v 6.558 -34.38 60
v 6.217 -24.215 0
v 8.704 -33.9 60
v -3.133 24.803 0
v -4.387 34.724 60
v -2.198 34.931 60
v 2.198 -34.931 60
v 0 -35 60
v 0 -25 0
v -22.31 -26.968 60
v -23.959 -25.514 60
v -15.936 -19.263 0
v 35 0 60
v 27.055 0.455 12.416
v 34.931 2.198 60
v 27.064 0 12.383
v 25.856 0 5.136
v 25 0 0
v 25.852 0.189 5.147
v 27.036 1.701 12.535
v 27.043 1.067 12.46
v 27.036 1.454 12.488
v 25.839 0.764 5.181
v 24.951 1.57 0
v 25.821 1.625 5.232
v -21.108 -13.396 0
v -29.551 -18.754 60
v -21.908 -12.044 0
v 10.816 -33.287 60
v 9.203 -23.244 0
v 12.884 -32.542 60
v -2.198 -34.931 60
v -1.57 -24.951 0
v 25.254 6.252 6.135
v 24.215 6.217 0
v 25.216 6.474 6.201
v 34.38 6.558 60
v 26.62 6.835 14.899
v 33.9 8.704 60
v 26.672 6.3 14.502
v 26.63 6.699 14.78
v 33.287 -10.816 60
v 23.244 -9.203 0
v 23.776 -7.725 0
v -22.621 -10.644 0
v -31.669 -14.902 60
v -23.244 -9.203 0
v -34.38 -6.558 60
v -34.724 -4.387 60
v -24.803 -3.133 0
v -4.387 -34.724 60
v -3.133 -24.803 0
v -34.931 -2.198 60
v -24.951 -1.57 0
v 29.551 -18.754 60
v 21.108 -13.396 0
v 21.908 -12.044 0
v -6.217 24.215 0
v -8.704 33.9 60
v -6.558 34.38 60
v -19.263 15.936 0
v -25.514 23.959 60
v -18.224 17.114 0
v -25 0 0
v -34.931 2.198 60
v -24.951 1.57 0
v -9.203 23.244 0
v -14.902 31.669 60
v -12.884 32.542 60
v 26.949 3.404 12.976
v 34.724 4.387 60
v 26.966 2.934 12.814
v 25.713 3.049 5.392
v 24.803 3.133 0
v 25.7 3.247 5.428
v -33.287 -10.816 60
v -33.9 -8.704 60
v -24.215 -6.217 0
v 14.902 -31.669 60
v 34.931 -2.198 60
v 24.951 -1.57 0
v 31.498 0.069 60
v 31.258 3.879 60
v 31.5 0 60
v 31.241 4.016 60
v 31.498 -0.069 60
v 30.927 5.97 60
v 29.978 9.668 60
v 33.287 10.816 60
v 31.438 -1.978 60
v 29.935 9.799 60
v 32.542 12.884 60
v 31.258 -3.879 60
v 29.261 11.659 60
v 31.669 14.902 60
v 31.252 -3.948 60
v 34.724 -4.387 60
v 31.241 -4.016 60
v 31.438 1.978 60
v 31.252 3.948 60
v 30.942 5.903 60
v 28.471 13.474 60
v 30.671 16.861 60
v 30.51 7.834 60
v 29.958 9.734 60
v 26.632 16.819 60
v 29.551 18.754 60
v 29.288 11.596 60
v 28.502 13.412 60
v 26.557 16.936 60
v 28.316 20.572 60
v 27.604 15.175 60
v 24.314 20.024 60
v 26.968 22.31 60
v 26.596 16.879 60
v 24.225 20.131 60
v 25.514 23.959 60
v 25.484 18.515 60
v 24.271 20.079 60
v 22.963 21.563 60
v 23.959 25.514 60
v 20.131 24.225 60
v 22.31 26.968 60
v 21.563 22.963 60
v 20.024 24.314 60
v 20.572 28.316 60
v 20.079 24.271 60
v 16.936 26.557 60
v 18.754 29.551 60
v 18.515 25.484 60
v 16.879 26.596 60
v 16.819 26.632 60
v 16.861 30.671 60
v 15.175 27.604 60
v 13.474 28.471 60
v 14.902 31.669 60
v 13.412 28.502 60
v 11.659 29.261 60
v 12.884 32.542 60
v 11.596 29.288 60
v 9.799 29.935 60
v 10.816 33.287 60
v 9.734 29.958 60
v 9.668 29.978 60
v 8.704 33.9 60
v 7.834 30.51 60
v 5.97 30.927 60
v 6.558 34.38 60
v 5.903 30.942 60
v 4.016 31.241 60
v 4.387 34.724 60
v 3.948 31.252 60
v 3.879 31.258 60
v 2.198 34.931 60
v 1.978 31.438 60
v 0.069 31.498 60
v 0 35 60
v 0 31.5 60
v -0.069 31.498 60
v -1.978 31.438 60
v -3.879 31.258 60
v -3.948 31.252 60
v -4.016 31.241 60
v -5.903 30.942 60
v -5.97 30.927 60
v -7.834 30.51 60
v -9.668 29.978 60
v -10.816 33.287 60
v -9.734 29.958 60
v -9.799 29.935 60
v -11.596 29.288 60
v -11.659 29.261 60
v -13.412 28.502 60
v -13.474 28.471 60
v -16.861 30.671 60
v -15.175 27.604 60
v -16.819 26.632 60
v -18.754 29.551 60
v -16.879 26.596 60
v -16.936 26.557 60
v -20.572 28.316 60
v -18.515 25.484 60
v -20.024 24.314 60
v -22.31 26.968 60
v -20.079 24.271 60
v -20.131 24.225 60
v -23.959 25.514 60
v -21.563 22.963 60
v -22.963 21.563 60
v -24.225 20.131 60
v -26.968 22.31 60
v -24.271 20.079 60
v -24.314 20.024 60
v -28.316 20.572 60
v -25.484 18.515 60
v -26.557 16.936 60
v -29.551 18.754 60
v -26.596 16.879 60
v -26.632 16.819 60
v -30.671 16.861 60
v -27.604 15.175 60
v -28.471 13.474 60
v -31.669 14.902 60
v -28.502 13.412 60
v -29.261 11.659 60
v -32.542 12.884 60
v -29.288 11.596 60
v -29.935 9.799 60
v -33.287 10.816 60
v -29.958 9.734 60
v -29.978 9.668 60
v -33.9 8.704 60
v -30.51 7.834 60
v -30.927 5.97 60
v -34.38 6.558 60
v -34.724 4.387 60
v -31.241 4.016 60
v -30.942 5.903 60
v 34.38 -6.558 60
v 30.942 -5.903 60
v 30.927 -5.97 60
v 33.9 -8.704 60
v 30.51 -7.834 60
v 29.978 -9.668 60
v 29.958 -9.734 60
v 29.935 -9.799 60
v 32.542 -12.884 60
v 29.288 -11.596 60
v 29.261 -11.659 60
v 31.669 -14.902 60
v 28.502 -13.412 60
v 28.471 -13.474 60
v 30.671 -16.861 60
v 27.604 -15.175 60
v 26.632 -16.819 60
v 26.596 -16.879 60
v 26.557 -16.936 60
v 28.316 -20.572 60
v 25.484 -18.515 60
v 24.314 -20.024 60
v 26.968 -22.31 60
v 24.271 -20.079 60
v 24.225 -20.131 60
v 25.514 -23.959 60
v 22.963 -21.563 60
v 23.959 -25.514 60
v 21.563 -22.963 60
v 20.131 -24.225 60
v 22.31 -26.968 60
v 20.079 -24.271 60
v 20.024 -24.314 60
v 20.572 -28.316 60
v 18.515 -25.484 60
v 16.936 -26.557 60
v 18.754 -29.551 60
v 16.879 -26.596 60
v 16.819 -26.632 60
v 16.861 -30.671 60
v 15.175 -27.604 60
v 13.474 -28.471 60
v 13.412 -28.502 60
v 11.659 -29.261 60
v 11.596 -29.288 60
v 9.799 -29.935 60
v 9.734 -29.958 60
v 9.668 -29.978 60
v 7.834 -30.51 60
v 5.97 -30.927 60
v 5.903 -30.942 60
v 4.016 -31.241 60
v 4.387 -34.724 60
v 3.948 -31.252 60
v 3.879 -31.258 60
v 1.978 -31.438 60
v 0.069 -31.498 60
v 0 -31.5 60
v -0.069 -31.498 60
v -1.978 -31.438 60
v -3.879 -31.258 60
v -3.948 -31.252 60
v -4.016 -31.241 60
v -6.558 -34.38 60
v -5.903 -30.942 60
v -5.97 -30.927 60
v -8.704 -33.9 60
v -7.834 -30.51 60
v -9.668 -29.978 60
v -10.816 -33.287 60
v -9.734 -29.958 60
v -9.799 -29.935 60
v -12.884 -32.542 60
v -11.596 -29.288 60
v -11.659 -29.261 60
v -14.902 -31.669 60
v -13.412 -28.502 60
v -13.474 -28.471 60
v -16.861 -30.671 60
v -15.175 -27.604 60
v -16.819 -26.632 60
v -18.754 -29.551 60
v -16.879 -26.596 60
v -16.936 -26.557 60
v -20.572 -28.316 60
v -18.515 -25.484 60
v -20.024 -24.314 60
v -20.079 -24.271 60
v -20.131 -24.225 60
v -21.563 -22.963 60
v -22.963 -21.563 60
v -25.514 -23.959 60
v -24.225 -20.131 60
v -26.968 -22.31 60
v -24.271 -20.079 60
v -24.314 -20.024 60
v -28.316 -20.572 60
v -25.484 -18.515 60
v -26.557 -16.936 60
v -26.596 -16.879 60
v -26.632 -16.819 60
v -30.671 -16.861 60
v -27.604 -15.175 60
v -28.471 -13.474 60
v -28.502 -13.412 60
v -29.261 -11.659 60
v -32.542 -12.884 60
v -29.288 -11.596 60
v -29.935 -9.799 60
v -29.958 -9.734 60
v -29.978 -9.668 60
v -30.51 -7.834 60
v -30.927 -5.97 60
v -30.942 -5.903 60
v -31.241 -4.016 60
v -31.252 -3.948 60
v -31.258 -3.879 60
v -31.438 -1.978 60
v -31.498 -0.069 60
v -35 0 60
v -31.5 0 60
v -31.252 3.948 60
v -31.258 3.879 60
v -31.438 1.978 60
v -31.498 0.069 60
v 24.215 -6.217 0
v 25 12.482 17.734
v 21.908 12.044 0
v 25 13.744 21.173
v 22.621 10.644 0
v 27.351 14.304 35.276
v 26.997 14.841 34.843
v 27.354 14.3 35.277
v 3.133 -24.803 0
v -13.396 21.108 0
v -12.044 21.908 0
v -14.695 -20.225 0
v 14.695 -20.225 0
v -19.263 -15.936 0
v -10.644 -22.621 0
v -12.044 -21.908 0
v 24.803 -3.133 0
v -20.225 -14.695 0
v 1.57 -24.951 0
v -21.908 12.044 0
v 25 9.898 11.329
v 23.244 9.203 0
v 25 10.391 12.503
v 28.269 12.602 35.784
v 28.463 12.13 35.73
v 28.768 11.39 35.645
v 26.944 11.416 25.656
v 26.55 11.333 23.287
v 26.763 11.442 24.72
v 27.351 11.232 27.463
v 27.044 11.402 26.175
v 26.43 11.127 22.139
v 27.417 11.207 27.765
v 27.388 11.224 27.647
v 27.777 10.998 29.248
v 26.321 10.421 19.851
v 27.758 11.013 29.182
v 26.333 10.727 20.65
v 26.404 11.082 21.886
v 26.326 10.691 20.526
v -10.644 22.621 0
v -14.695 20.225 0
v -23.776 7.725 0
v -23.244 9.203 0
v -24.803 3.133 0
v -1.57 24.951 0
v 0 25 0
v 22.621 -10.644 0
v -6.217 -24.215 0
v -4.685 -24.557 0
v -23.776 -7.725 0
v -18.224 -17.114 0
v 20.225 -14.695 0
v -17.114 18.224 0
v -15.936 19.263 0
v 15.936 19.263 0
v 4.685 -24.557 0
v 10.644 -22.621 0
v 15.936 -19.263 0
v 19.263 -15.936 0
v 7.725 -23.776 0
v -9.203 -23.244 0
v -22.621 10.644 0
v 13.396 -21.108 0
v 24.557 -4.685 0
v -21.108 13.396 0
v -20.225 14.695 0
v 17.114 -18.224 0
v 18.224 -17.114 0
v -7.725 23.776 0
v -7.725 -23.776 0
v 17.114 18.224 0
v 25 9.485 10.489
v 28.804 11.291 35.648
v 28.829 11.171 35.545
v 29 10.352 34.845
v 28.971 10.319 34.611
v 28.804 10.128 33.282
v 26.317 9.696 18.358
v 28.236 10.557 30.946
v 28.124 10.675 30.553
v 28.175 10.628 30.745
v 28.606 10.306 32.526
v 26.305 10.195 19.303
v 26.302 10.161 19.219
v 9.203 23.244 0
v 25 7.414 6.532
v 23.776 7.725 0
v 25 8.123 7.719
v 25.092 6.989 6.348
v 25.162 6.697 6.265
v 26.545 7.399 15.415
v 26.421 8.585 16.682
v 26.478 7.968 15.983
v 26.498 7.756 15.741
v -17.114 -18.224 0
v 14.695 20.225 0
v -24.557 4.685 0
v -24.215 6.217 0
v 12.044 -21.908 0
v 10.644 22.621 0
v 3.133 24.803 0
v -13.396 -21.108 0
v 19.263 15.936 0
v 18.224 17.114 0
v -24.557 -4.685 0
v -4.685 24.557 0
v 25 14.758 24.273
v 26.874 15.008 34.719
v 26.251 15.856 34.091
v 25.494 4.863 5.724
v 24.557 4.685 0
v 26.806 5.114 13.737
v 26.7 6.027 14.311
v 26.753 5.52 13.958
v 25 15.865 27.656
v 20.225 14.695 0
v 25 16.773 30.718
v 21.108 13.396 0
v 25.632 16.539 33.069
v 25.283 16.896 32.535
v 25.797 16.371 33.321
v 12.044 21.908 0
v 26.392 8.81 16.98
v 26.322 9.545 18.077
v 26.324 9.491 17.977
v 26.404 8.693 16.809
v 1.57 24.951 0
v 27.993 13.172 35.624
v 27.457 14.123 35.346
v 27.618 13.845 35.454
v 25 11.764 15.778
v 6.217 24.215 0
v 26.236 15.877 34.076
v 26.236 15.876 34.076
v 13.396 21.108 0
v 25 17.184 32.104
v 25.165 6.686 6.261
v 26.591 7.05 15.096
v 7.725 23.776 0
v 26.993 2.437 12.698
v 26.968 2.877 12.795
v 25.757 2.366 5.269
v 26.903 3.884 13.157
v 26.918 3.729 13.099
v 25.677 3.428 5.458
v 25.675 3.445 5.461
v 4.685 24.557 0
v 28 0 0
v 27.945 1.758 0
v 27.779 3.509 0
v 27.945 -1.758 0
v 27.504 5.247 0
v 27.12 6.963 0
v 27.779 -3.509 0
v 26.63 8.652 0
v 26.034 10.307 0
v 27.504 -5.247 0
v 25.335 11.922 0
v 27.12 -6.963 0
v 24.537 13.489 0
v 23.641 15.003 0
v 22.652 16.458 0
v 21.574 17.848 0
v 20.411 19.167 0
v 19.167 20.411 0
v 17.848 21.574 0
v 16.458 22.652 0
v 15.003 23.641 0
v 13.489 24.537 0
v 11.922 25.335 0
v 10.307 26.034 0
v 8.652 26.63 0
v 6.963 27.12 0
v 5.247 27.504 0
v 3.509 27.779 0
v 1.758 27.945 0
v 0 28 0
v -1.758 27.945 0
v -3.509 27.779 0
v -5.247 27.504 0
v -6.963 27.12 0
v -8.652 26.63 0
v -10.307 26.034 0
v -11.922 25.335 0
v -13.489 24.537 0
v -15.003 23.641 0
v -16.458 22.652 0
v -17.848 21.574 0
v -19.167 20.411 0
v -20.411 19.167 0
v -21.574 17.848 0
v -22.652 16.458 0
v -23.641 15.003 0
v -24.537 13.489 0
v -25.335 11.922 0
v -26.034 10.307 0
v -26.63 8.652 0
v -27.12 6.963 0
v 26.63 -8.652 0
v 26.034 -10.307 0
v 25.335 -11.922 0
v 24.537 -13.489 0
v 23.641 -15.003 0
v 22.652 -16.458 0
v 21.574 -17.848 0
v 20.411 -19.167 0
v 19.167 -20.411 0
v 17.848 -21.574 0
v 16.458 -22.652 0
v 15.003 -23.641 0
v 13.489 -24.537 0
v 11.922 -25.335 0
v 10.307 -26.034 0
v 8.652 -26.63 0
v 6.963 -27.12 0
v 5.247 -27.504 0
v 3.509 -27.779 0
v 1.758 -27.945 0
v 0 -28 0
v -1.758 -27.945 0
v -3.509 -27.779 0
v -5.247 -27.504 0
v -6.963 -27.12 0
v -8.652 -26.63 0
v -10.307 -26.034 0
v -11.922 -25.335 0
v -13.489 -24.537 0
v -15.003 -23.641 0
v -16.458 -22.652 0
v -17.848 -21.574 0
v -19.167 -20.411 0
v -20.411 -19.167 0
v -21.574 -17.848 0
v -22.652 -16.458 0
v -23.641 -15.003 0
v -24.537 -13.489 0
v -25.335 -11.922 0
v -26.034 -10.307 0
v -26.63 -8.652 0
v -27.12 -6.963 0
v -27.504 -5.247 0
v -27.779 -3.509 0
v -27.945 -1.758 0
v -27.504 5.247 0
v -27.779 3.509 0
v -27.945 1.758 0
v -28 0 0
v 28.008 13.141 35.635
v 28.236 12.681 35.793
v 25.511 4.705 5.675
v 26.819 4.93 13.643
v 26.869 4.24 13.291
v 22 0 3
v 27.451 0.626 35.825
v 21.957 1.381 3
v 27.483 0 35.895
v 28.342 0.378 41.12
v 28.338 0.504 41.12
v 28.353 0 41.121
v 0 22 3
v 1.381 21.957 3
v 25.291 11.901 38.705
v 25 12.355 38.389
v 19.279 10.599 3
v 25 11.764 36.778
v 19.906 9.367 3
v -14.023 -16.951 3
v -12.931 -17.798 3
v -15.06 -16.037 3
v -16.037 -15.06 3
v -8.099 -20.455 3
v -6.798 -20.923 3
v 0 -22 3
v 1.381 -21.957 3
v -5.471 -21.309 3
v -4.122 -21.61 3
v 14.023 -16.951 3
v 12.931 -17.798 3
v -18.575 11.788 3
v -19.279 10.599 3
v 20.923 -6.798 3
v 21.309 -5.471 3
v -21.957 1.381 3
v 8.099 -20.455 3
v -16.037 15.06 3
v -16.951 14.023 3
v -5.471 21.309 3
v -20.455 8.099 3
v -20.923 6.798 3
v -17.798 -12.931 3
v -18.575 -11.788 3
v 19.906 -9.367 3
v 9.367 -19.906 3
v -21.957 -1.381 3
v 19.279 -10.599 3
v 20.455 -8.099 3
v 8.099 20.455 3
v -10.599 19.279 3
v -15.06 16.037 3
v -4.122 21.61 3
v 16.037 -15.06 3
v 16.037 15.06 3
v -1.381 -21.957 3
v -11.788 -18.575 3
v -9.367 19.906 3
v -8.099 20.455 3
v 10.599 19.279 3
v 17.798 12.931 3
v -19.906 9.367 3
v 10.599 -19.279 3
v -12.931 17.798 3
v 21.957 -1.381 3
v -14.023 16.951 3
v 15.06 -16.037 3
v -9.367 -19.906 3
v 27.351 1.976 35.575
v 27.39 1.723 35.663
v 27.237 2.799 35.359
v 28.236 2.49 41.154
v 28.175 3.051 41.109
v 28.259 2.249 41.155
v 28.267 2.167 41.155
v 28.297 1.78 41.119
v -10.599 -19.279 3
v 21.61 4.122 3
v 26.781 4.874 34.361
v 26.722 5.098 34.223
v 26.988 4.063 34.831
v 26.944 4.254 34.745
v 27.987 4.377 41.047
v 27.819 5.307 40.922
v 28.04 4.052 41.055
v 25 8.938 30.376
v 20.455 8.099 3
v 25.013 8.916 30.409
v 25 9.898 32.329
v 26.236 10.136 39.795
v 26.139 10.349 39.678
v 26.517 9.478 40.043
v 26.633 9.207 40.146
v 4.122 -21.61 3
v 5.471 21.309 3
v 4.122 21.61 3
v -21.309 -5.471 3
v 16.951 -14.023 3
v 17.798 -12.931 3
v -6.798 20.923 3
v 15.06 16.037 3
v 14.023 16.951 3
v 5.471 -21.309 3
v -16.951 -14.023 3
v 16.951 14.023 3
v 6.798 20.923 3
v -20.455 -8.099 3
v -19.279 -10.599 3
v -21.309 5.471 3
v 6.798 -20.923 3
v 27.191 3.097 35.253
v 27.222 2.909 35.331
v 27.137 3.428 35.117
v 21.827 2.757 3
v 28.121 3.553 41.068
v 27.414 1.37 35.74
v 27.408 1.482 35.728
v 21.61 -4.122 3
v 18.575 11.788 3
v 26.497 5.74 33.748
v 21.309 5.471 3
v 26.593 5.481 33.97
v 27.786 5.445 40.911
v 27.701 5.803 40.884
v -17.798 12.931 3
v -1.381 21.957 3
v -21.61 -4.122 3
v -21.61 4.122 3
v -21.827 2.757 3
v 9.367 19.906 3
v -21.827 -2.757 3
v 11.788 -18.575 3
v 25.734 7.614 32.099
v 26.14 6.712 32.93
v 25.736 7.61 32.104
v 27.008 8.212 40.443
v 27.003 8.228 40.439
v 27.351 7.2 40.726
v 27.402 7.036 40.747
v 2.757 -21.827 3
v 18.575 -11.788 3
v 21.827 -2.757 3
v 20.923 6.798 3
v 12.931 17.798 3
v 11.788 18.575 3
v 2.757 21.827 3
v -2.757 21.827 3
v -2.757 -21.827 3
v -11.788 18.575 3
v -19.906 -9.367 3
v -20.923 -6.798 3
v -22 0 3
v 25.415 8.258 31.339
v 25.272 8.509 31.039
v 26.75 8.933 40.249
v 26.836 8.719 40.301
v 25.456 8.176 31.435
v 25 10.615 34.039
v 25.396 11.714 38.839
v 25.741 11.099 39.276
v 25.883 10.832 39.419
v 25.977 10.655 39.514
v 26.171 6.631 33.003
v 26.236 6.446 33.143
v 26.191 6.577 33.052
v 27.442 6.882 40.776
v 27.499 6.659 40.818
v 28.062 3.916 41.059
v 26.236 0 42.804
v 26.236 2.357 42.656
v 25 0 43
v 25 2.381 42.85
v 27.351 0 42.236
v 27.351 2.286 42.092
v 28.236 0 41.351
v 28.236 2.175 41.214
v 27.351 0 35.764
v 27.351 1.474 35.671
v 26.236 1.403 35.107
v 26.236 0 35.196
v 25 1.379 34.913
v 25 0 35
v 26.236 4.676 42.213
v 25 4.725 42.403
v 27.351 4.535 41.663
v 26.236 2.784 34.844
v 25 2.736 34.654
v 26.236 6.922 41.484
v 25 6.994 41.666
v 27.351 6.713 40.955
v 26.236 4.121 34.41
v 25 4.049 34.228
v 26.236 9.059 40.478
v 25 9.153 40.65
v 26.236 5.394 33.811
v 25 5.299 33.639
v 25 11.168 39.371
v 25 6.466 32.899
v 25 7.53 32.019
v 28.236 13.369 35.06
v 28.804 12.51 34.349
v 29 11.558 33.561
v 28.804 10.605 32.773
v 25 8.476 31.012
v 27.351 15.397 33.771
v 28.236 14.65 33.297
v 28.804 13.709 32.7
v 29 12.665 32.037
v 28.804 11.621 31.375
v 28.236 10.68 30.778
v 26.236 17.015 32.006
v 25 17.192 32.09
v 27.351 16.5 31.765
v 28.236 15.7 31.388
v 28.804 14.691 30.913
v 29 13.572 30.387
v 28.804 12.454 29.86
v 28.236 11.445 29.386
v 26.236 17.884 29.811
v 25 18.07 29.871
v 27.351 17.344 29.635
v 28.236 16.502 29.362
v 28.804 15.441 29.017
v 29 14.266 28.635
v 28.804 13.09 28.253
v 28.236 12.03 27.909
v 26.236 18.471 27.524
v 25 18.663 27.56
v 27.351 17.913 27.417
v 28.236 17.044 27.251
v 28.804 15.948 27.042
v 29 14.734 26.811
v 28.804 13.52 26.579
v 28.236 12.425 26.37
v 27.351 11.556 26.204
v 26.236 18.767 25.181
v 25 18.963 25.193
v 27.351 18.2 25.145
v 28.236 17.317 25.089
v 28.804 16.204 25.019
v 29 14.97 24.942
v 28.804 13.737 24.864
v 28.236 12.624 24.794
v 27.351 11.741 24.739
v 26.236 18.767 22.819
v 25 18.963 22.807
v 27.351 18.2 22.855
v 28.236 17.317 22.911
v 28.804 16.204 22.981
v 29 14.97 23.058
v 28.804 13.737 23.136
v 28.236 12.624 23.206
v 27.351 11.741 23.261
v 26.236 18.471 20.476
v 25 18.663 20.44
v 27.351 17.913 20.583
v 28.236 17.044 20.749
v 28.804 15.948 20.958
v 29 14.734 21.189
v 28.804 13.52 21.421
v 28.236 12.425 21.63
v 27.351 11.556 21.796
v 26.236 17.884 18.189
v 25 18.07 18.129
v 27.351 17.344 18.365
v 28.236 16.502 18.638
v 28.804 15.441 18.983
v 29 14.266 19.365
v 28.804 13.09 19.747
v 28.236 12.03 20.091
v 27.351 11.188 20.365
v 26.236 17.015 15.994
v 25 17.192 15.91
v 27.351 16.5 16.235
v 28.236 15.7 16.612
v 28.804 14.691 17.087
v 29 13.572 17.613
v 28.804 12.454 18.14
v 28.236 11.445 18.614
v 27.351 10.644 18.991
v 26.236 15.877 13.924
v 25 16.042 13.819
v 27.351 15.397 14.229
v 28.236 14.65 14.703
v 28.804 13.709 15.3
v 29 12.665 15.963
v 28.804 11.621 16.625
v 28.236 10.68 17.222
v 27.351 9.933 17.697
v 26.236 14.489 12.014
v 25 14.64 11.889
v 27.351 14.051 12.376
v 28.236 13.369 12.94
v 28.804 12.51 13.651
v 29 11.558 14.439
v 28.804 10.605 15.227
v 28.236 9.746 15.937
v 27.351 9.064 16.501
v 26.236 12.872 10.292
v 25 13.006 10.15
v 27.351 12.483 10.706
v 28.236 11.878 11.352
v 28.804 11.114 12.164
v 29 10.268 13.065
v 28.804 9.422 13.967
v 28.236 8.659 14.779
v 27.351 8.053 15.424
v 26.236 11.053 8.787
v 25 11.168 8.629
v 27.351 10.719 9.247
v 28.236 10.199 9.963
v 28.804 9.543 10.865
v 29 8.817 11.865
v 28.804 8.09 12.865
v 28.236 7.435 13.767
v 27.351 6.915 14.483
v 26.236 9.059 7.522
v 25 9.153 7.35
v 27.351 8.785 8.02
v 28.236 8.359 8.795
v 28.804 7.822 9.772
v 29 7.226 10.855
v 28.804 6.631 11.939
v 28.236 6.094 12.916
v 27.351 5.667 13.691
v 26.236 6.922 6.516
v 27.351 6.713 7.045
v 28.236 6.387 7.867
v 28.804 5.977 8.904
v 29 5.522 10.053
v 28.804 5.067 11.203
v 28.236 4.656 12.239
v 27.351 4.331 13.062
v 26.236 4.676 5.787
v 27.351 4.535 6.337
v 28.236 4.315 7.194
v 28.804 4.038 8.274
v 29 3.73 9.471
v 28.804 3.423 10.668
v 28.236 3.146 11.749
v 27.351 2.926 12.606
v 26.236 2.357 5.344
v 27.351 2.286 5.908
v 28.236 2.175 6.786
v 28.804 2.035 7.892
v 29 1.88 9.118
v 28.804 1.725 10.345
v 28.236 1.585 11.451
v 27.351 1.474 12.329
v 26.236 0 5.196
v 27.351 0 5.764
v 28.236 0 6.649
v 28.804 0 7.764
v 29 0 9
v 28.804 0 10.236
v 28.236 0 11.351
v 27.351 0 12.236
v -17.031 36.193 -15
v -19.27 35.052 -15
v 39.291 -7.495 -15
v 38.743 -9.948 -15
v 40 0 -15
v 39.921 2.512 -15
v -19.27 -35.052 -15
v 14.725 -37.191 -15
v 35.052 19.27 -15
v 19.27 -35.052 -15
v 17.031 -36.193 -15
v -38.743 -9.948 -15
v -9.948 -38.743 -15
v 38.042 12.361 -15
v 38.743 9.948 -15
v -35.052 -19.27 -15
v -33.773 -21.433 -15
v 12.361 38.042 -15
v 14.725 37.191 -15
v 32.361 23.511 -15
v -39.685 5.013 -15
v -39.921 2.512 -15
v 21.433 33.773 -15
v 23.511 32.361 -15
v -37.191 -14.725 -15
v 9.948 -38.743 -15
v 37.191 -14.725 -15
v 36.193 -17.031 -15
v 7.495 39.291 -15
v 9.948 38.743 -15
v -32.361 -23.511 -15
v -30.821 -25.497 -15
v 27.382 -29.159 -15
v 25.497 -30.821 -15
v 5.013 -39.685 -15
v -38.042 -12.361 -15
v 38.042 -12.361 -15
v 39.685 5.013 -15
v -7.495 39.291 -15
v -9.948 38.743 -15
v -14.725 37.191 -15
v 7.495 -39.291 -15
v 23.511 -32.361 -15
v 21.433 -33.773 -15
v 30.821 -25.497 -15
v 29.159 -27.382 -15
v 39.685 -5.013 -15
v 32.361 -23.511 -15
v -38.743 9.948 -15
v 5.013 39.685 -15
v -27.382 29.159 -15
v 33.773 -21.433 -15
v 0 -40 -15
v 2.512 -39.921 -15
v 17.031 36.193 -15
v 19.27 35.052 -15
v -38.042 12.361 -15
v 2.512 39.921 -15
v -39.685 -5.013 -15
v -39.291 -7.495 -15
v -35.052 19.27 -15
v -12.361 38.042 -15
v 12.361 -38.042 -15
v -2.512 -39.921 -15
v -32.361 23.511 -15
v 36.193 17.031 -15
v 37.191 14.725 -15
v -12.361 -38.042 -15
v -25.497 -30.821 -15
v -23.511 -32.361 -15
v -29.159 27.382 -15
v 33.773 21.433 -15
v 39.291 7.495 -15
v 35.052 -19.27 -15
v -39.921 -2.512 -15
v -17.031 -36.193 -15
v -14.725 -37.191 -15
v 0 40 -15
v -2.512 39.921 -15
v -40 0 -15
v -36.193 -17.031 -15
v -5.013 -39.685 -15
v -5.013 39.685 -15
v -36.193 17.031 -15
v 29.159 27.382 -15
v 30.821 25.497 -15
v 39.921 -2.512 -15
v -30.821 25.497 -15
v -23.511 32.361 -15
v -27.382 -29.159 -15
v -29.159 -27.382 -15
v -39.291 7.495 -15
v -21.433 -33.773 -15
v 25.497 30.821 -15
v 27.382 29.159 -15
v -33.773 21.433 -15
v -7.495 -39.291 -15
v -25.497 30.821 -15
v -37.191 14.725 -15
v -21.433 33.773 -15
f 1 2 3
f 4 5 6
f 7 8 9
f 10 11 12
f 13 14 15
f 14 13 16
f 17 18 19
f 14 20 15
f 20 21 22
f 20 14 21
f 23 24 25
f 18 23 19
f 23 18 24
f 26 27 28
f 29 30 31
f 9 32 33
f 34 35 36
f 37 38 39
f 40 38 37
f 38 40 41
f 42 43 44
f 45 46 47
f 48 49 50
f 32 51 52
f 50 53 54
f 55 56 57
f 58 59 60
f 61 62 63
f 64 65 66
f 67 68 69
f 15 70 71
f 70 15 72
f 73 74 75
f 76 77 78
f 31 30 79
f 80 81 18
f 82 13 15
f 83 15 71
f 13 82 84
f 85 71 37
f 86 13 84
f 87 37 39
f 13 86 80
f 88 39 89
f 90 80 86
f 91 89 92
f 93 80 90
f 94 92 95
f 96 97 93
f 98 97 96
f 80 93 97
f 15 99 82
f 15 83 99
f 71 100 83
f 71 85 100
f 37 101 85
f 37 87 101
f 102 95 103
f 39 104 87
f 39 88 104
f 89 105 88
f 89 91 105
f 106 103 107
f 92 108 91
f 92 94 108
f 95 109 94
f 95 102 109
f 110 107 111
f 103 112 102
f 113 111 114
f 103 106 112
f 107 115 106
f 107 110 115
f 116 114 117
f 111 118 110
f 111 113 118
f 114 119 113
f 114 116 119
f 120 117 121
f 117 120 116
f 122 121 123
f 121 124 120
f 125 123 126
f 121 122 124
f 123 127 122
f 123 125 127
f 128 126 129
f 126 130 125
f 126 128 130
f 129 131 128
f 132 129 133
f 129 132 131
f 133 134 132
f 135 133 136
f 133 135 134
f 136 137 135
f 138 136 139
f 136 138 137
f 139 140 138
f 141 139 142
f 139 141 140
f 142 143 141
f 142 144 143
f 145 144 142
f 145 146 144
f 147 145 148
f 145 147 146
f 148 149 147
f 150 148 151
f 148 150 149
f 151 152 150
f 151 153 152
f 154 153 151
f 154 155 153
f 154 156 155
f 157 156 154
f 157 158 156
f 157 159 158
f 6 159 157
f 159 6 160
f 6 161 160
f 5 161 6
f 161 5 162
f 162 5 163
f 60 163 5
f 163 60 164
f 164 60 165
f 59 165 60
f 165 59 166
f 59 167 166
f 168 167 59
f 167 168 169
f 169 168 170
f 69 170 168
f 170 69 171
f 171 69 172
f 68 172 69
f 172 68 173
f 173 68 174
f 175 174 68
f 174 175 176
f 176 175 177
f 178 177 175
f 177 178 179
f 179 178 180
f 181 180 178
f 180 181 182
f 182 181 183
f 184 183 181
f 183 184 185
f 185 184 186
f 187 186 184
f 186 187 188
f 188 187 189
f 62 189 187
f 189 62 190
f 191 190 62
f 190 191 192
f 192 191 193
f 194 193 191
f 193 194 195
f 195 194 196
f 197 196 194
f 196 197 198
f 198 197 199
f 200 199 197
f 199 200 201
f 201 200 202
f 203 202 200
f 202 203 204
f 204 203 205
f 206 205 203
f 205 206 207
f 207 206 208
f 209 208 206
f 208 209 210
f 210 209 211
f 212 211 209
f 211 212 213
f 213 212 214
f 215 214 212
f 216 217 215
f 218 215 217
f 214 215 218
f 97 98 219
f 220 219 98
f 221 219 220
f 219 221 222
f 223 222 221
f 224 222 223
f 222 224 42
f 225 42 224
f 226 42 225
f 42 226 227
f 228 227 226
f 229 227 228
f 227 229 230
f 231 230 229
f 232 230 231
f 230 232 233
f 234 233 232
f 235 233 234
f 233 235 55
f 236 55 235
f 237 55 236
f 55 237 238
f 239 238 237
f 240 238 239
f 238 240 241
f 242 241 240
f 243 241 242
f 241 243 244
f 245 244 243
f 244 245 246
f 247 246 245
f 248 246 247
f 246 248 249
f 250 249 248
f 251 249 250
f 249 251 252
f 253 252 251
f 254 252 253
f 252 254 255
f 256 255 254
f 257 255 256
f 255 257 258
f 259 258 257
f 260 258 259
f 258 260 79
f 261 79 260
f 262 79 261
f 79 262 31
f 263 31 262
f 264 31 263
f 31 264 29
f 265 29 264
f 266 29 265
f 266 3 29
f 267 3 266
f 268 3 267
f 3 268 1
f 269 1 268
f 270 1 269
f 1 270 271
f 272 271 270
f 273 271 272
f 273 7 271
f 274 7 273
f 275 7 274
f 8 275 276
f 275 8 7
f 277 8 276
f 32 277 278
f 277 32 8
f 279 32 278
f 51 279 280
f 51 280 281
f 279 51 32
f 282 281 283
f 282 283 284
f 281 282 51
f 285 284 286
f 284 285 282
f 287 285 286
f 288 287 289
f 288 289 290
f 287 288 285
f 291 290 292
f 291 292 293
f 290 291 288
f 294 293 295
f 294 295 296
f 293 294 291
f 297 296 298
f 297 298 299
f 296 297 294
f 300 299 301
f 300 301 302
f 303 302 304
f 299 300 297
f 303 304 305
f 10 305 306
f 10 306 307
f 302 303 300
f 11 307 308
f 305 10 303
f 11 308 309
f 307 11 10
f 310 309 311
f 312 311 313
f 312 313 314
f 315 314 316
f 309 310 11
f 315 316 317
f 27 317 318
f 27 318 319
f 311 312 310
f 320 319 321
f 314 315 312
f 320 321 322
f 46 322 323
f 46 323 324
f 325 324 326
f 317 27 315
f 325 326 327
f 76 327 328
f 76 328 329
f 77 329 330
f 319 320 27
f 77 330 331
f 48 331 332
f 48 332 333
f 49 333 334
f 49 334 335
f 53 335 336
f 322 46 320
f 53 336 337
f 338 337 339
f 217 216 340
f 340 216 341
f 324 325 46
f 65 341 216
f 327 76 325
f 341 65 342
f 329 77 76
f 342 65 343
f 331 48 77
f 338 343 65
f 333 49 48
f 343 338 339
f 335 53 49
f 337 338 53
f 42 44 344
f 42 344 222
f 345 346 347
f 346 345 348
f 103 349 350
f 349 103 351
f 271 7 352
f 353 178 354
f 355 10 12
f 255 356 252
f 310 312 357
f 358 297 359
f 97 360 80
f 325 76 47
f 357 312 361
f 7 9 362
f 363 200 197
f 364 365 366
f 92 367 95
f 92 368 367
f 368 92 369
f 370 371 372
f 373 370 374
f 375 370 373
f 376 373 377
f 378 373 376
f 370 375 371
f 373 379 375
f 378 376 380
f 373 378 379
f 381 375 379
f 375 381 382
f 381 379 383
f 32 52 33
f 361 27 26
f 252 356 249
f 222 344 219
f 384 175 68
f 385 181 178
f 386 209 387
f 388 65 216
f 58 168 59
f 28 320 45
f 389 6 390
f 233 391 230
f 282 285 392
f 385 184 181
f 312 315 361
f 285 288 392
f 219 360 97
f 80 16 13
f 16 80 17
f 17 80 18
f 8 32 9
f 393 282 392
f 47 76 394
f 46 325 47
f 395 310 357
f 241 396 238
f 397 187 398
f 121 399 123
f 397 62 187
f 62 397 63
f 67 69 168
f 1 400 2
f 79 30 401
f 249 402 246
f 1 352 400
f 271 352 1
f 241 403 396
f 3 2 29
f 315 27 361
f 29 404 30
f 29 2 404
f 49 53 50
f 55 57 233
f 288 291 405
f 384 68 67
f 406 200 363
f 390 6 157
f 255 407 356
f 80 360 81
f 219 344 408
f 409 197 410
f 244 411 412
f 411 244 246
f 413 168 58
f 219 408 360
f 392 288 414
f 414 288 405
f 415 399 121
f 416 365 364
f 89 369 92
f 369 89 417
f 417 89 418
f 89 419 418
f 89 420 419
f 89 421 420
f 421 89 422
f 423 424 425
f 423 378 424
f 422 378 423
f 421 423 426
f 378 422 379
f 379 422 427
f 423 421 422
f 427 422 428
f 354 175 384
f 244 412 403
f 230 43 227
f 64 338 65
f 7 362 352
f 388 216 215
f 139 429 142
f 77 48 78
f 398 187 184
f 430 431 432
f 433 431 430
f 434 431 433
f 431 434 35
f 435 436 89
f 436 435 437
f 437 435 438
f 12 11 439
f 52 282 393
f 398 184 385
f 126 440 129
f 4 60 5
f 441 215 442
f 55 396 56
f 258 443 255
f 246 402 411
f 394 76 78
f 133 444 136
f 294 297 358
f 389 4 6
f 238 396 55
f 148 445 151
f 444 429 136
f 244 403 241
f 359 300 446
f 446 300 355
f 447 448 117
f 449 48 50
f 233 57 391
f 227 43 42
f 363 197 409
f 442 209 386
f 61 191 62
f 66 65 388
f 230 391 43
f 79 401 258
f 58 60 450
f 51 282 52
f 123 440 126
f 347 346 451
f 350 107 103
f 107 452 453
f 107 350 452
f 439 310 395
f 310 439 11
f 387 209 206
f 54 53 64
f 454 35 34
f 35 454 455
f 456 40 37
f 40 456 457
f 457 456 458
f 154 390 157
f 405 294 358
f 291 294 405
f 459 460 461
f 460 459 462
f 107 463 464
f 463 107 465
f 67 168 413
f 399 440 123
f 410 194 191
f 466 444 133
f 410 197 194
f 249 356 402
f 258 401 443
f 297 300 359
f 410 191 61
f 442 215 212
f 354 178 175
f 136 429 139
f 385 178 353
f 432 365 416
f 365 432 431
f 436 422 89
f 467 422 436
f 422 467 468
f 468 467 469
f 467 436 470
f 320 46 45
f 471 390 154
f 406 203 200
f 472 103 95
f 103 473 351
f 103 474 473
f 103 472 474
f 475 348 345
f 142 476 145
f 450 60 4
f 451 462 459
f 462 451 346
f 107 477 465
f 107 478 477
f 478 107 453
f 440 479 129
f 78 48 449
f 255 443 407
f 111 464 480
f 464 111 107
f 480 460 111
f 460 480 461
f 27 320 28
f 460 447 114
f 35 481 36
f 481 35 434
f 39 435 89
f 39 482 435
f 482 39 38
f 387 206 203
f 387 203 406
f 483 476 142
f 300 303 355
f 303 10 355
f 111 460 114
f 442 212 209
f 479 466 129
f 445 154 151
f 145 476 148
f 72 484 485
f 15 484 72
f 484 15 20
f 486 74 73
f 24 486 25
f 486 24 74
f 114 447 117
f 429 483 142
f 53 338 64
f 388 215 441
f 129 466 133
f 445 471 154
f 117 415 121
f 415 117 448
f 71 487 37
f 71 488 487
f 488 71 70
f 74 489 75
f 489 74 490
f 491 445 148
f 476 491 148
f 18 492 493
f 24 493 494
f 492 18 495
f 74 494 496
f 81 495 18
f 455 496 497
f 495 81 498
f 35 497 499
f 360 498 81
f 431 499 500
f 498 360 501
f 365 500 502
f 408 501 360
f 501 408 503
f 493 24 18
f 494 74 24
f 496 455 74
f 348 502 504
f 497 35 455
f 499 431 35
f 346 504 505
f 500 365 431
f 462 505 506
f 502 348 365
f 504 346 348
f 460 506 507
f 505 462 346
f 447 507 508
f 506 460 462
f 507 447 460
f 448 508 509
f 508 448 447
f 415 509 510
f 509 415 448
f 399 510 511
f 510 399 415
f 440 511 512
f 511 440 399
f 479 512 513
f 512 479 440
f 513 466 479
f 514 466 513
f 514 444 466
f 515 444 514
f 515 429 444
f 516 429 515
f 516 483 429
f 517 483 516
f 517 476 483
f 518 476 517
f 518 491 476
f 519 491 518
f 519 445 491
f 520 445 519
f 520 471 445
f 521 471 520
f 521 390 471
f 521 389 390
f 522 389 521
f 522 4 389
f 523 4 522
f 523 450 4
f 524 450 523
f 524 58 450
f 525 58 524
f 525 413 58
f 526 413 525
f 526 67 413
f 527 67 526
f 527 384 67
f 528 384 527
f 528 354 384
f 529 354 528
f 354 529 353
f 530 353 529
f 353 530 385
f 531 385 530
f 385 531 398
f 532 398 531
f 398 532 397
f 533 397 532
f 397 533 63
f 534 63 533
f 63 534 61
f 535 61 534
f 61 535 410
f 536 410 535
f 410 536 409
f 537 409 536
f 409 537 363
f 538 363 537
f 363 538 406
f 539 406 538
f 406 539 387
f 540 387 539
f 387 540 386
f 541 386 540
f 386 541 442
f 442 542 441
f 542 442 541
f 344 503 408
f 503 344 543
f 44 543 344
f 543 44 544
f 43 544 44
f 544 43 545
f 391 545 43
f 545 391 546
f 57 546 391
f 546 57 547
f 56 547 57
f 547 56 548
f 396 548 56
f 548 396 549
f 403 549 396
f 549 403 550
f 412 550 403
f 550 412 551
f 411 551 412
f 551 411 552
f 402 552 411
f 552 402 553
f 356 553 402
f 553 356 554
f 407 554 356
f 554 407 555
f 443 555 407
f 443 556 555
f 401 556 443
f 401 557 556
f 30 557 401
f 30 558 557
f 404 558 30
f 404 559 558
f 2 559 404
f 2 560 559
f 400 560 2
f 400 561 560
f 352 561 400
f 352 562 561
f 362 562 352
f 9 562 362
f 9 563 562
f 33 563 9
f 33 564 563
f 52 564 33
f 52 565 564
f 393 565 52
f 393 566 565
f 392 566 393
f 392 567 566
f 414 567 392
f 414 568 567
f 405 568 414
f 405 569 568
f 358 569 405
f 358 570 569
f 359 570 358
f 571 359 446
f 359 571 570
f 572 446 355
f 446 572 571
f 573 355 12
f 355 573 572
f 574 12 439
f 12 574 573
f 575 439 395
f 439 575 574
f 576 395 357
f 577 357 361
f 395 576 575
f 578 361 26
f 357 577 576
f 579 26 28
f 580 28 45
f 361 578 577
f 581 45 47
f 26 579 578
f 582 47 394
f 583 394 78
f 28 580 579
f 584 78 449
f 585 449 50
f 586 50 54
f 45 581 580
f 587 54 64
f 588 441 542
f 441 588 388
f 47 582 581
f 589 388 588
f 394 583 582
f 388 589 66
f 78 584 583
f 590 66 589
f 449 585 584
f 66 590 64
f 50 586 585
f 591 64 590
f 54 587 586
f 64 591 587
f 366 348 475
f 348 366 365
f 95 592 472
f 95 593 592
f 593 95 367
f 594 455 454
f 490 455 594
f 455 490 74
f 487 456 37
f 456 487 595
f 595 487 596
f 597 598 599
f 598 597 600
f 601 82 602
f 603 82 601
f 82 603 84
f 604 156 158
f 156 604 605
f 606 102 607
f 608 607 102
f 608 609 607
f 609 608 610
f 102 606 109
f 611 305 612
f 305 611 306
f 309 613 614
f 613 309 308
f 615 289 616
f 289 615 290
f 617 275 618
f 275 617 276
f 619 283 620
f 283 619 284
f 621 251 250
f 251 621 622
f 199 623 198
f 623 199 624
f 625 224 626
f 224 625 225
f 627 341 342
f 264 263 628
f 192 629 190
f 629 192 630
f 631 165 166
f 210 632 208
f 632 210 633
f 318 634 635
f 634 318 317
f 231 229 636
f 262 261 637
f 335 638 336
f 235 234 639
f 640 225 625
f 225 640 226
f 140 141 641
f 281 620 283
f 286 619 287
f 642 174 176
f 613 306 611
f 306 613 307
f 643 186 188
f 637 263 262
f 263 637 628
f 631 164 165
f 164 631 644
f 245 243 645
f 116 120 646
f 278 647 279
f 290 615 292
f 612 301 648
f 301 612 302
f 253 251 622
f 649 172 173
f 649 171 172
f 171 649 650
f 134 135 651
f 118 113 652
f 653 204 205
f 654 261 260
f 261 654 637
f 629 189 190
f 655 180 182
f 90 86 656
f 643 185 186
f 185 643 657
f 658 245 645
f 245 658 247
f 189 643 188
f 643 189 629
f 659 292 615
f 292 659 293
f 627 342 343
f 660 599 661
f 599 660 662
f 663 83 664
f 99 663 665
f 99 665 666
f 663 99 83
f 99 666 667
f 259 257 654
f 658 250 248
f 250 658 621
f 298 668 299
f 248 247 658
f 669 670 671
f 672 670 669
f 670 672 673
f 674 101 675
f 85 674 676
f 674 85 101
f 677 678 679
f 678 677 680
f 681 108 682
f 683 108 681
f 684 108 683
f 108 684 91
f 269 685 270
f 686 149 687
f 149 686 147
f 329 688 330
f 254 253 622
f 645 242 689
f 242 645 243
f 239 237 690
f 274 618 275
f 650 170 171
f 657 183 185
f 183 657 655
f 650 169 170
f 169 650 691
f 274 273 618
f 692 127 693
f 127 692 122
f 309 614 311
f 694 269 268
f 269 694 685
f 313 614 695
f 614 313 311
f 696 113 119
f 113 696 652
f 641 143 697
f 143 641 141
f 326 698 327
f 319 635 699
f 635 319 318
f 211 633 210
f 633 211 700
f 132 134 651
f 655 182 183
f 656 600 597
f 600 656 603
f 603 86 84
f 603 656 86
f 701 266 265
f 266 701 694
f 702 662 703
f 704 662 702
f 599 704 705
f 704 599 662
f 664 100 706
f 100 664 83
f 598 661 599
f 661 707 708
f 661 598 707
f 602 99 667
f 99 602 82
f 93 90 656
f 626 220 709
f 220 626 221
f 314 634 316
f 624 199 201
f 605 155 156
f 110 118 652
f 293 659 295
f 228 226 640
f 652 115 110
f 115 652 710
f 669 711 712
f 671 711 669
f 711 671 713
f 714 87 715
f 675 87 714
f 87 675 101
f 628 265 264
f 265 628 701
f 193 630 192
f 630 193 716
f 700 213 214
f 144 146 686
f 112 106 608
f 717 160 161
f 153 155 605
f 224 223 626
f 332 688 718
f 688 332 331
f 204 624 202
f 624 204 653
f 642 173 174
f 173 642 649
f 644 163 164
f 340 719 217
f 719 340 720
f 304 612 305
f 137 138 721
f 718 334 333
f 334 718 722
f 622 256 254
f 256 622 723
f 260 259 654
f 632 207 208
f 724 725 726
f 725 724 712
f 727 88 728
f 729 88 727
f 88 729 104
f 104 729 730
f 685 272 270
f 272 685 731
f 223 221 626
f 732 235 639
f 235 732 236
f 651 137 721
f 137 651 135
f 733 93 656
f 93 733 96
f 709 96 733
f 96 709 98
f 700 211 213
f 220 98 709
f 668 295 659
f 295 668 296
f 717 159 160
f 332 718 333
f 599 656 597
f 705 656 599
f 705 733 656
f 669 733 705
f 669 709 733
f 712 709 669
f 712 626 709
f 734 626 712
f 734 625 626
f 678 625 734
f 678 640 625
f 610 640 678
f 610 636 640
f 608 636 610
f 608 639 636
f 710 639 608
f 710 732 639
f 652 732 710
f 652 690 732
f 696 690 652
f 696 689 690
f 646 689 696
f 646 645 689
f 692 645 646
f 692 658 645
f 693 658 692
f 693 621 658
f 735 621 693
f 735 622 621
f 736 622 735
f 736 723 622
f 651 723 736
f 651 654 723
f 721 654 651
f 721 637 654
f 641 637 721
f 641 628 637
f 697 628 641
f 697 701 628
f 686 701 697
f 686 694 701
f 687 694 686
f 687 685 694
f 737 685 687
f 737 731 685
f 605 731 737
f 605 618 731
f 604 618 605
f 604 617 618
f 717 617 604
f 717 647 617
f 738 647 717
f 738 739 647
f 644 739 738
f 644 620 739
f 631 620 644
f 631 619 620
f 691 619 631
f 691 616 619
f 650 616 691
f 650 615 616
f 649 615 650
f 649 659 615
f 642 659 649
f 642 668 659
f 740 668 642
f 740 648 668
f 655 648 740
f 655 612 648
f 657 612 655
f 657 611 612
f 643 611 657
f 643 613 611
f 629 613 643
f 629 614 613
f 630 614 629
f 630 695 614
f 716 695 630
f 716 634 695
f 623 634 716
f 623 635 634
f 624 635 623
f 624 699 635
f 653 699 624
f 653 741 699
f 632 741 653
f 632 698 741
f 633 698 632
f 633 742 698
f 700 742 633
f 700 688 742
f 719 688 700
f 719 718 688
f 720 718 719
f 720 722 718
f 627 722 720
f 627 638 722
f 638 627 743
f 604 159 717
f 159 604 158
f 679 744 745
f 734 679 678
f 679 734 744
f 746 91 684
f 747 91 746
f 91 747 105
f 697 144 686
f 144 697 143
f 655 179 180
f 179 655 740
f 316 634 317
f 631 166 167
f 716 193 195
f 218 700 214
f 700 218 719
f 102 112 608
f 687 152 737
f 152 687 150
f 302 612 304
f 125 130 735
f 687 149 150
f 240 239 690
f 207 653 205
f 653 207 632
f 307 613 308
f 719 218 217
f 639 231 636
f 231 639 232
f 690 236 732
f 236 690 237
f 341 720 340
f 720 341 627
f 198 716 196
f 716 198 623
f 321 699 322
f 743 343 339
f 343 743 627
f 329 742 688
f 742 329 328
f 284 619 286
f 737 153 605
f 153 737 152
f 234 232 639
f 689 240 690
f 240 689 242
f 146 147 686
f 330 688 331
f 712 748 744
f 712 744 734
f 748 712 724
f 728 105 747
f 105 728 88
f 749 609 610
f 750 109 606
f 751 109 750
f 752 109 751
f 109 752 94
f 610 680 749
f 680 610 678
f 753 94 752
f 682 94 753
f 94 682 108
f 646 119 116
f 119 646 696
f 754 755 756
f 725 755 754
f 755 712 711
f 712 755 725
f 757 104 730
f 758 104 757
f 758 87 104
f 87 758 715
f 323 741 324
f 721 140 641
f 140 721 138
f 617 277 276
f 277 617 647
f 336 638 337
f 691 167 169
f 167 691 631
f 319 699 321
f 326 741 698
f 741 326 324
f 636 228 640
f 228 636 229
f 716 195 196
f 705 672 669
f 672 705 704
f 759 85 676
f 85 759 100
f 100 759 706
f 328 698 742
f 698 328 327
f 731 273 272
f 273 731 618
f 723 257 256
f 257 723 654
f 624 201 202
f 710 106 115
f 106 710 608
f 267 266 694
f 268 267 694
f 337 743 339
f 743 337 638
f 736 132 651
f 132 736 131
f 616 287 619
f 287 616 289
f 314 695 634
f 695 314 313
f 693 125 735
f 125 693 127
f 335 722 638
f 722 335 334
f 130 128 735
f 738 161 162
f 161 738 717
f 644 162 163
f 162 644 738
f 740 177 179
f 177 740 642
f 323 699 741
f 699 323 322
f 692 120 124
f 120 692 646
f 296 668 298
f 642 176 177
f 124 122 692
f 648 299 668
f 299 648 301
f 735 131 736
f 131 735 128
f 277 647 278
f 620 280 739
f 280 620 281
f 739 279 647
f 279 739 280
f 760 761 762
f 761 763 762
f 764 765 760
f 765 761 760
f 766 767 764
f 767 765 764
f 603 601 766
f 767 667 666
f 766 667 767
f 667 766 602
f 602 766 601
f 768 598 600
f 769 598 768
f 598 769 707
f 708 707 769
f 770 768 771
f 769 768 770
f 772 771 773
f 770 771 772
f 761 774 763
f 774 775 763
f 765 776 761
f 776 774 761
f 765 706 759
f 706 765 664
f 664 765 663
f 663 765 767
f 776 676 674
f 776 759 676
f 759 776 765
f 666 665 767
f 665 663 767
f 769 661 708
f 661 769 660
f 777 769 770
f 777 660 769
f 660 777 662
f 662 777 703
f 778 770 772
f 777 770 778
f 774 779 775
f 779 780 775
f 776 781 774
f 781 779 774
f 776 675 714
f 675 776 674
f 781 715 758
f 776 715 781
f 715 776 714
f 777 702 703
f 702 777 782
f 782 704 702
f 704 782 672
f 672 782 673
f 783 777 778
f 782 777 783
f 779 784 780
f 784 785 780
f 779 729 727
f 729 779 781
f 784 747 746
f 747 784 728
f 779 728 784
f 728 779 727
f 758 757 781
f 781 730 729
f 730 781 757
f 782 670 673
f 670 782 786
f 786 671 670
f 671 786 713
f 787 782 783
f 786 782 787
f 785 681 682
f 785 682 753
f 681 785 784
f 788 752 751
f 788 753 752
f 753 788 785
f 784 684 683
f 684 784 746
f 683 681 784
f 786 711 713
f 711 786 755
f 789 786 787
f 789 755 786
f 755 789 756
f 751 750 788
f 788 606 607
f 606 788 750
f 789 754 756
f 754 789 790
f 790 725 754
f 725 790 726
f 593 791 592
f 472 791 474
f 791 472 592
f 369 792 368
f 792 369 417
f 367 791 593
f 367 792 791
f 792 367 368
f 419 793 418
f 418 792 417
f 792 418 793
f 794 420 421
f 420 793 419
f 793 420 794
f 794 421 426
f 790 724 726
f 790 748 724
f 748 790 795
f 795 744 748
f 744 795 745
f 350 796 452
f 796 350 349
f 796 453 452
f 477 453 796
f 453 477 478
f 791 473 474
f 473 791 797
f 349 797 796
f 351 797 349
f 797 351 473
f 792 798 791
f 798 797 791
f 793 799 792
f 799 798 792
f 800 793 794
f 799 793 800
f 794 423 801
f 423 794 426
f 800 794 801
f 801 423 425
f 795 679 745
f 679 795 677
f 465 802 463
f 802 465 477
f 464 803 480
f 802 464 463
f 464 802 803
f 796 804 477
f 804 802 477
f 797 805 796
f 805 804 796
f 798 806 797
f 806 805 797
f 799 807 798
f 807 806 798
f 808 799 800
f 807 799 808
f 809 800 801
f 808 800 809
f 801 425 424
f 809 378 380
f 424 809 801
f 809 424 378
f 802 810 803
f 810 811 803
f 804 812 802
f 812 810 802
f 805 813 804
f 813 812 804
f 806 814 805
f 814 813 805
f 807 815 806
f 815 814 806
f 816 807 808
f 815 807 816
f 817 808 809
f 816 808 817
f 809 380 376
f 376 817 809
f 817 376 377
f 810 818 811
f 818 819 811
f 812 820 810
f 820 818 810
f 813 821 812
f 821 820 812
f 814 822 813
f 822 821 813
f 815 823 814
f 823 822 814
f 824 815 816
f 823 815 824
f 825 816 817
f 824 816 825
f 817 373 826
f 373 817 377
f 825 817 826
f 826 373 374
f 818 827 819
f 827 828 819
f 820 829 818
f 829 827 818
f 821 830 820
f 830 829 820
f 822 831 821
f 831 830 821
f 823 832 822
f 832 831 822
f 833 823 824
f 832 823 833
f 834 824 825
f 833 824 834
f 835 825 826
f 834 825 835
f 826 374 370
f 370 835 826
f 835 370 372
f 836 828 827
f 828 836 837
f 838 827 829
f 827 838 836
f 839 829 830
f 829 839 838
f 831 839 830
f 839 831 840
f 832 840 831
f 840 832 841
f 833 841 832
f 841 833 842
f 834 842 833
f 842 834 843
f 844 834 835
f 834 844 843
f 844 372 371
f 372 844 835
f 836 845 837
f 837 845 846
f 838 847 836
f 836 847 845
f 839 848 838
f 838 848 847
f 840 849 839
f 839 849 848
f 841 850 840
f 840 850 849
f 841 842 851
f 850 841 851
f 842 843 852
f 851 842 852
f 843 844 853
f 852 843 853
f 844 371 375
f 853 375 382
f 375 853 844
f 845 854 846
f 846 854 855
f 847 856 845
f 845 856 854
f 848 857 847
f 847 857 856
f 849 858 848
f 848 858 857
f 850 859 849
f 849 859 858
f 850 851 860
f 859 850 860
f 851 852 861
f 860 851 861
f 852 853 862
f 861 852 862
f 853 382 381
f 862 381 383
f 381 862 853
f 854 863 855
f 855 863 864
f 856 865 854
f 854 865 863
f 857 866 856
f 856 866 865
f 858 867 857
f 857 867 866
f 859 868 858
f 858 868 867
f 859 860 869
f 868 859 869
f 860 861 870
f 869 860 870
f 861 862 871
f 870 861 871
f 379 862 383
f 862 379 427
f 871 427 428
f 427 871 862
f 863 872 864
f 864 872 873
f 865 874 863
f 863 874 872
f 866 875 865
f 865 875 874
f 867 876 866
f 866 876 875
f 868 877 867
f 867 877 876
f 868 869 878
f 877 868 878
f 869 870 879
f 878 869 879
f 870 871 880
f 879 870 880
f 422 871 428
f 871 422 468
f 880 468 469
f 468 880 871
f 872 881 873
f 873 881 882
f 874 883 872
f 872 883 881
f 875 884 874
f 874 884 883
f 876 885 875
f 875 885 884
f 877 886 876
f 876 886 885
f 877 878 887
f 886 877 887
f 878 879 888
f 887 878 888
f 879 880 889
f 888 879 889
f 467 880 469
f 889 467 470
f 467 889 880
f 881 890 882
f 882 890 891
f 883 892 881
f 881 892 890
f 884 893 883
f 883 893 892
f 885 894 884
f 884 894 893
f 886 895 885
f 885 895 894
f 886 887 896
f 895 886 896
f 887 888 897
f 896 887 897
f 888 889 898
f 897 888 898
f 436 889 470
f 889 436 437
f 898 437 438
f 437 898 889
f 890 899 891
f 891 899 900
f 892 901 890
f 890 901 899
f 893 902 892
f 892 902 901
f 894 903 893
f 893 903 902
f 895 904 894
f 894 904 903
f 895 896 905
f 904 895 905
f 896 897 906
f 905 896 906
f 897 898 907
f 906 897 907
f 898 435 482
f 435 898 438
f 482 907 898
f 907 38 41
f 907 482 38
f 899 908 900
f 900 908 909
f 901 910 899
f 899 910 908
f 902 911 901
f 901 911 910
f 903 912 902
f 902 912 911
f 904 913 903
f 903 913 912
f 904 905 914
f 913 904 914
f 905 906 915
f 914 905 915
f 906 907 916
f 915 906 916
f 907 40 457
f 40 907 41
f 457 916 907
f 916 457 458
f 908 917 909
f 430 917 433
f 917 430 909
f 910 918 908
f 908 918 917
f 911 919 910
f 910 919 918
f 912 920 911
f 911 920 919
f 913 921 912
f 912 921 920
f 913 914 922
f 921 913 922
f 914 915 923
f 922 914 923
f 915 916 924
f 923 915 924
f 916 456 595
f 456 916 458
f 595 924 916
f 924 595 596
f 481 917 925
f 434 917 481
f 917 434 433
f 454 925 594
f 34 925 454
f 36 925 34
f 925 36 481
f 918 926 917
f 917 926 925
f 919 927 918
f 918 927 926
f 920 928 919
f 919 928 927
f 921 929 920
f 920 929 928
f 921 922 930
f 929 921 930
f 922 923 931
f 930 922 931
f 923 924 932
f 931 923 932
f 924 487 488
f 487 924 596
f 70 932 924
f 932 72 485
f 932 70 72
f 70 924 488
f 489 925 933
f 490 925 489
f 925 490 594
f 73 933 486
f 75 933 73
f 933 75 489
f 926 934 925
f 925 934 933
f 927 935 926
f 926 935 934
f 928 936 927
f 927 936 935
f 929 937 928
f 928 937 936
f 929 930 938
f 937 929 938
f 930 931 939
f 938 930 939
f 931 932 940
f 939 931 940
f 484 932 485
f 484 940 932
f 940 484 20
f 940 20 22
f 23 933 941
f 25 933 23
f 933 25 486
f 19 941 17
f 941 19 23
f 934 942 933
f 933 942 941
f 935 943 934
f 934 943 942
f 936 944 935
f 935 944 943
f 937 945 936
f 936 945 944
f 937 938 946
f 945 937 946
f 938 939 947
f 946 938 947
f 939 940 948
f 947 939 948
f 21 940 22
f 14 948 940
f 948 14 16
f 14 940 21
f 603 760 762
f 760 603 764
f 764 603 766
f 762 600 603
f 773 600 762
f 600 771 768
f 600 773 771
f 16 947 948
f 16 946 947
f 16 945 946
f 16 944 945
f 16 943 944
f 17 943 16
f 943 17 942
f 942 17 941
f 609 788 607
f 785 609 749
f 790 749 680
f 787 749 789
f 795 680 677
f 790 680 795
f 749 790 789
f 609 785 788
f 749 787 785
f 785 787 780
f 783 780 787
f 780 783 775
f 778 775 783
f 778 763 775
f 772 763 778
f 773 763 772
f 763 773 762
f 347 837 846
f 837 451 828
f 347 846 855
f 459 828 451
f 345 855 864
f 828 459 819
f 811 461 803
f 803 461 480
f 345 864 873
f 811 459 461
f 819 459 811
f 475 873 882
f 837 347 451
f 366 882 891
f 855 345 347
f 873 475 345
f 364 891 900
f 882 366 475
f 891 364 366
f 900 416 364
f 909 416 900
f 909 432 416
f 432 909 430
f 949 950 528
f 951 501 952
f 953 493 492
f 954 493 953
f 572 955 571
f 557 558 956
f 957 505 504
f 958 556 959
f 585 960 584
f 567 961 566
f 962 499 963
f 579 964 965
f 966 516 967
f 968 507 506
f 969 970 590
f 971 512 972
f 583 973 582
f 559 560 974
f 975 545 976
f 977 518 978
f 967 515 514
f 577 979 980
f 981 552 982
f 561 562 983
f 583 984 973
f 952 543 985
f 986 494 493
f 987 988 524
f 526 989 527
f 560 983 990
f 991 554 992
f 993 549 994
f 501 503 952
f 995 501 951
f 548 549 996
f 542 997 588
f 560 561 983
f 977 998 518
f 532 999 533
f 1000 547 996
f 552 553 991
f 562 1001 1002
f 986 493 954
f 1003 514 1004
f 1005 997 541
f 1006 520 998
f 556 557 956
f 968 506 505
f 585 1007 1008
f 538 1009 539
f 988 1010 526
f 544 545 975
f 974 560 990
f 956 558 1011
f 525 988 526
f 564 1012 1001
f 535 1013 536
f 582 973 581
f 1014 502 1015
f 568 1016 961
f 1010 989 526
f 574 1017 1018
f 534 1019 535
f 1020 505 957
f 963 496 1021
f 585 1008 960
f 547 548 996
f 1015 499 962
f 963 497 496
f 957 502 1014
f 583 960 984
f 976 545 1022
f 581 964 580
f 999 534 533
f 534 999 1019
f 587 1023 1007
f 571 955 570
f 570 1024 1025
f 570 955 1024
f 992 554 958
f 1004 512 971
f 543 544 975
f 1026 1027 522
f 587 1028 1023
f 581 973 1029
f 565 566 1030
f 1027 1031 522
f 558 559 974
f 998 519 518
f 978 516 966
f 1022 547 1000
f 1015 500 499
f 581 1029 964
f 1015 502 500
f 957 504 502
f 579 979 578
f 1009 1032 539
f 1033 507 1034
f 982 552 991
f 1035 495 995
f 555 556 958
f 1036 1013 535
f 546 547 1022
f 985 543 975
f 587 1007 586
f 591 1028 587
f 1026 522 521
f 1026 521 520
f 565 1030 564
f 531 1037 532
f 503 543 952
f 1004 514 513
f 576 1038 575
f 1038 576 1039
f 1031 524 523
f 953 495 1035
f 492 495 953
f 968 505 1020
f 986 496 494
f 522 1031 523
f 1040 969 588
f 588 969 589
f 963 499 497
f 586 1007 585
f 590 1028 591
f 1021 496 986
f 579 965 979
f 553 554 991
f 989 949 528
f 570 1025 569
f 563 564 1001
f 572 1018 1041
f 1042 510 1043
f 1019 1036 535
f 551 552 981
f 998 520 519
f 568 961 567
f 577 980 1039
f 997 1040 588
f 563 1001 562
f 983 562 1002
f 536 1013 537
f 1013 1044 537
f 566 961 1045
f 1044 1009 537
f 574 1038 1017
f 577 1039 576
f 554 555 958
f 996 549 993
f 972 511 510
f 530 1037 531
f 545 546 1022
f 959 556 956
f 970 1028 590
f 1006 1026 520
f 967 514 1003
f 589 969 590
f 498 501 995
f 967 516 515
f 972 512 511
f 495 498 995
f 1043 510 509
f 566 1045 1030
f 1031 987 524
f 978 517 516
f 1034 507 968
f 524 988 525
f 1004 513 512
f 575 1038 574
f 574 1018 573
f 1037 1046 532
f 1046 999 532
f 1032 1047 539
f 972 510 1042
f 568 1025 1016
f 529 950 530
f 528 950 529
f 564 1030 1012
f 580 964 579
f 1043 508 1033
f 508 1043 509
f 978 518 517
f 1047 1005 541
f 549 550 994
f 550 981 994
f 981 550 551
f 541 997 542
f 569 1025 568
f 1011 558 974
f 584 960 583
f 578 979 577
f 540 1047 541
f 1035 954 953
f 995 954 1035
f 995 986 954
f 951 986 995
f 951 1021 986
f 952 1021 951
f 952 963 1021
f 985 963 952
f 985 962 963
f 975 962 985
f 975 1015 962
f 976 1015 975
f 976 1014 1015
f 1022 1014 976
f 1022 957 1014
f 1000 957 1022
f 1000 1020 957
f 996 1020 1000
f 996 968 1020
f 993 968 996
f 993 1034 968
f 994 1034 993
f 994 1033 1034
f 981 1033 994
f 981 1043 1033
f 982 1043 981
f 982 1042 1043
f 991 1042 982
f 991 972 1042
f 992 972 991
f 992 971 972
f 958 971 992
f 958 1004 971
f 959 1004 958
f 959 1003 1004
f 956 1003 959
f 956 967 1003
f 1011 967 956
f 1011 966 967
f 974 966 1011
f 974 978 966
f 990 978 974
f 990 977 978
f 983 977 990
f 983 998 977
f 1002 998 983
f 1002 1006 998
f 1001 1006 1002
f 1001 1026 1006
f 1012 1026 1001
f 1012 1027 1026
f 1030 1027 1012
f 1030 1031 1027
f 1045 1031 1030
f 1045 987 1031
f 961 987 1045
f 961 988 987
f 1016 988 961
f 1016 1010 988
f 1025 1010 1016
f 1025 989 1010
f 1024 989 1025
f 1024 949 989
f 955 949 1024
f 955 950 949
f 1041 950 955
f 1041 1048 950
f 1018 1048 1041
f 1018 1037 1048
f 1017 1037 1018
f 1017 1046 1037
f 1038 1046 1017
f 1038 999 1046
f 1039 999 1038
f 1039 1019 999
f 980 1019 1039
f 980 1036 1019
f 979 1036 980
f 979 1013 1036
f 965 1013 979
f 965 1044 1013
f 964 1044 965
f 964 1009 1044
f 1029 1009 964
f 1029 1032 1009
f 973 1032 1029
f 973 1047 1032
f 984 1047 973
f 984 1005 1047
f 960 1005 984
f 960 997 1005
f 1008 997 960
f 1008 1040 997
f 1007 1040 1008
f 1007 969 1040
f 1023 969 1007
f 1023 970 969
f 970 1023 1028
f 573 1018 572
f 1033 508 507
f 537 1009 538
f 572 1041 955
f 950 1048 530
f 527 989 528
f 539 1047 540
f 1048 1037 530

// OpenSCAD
// OpenSCAD Cup with Pedestal
// A decorative cup with a circular pedestal base

// Parameters
cup_height = 60;        // Height of the cup
cup_top_radius = 35;    // Radius at the top of the cup
cup_bottom_radius = 25; // Radius at the bottom of the cup
cup_wall_thickness = 3; // Thickness of the cup walls

pedestal_height = 15;   // Height of the pedestal
pedestal_radius = 40;   // Radius of the pedestal base
pedestal_top_radius = 28; // Radius where pedestal meets cup

handle_width = 8;       // Width of the handle
handle_thickness = 6;   // Thickness of the handle
handle_offset = 25;     // Distance from cup center to handle

// Main assembly
union() {
    // Cup with handle
    cup_with_handle();
    
    // Pedestal base
    translate([0, 0, -pedestal_height])
        pedestal();
}

// Cup module
module cup_with_handle() {
    union() {
        // Main cup body
        cup_body();
        
        // Handle
        handle();
    }
}

// Cup body (hollow cylinder with tapered walls)
module cup_body() {
    difference() {
        // Outer cup shape
        cylinder(h = cup_height, 
                r1 = cup_bottom_radius, 
                r2 = cup_top_radius, 
                $fn = 100);
        
        // Inner hollow space
        translate([0, 0, cup_wall_thickness])
            cylinder(h = cup_height, 
                    r1 = cup_bottom_radius - cup_wall_thickness, 
                    r2 = cup_top_radius - cup_wall_thickness, 
                    $fn = 100);
    }
}

// Handle module
module handle() {
    translate([handle_offset, 0, cup_height * 0.4]) {
        rotate([0, 90, 0]) {
            difference() {
                // Outer torus for handle shape
                rotate_extrude($fn = 50) {
                    translate([15, 0, 0])
                        circle(r = handle_width/2, $fn = 20);
                }
                
                // Cut away part to create C-shape handle
                translate([-20, -25, -handle_width])
                    cube([40, 25, handle_width * 2]);
                
                // Cut away bottom part
                translate([-25, -25, -handle_width])
                    cube([50, 50, handle_width]);
            }
        }
    }
}

// Pedestal base
module pedestal() {
    // Tapered pedestal
    cylinder(h = pedestal_height, 
            r1 = pedestal_radius, 
            r2 = pedestal_top_radius, 
            $fn = 100);
}

// Optional: Add decorative rings to the pedestal
module decorative_pedestal() {
    union() {
        // Main pedestal
        pedestal();
        
        // Decorative rings
        for (i = [0.3, 0.7]) {
            translate([0, 0, pedestal_height * i])
                difference() {
                    cylinder(h = 2, 
                            r = pedestal_radius * (1 - i * 0.3) + 2, 
                            $fn = 100);
                    cylinder(h = 2, 
                            r = pedestal_radius * (1 - i * 0.3) - 1, 
                            $fn = 100);
                }
        }
    }
}

// Uncomment the line below to use decorative pedestal instead
// translate([0, 0, -pedestal_height]) decorative_pedestal();
